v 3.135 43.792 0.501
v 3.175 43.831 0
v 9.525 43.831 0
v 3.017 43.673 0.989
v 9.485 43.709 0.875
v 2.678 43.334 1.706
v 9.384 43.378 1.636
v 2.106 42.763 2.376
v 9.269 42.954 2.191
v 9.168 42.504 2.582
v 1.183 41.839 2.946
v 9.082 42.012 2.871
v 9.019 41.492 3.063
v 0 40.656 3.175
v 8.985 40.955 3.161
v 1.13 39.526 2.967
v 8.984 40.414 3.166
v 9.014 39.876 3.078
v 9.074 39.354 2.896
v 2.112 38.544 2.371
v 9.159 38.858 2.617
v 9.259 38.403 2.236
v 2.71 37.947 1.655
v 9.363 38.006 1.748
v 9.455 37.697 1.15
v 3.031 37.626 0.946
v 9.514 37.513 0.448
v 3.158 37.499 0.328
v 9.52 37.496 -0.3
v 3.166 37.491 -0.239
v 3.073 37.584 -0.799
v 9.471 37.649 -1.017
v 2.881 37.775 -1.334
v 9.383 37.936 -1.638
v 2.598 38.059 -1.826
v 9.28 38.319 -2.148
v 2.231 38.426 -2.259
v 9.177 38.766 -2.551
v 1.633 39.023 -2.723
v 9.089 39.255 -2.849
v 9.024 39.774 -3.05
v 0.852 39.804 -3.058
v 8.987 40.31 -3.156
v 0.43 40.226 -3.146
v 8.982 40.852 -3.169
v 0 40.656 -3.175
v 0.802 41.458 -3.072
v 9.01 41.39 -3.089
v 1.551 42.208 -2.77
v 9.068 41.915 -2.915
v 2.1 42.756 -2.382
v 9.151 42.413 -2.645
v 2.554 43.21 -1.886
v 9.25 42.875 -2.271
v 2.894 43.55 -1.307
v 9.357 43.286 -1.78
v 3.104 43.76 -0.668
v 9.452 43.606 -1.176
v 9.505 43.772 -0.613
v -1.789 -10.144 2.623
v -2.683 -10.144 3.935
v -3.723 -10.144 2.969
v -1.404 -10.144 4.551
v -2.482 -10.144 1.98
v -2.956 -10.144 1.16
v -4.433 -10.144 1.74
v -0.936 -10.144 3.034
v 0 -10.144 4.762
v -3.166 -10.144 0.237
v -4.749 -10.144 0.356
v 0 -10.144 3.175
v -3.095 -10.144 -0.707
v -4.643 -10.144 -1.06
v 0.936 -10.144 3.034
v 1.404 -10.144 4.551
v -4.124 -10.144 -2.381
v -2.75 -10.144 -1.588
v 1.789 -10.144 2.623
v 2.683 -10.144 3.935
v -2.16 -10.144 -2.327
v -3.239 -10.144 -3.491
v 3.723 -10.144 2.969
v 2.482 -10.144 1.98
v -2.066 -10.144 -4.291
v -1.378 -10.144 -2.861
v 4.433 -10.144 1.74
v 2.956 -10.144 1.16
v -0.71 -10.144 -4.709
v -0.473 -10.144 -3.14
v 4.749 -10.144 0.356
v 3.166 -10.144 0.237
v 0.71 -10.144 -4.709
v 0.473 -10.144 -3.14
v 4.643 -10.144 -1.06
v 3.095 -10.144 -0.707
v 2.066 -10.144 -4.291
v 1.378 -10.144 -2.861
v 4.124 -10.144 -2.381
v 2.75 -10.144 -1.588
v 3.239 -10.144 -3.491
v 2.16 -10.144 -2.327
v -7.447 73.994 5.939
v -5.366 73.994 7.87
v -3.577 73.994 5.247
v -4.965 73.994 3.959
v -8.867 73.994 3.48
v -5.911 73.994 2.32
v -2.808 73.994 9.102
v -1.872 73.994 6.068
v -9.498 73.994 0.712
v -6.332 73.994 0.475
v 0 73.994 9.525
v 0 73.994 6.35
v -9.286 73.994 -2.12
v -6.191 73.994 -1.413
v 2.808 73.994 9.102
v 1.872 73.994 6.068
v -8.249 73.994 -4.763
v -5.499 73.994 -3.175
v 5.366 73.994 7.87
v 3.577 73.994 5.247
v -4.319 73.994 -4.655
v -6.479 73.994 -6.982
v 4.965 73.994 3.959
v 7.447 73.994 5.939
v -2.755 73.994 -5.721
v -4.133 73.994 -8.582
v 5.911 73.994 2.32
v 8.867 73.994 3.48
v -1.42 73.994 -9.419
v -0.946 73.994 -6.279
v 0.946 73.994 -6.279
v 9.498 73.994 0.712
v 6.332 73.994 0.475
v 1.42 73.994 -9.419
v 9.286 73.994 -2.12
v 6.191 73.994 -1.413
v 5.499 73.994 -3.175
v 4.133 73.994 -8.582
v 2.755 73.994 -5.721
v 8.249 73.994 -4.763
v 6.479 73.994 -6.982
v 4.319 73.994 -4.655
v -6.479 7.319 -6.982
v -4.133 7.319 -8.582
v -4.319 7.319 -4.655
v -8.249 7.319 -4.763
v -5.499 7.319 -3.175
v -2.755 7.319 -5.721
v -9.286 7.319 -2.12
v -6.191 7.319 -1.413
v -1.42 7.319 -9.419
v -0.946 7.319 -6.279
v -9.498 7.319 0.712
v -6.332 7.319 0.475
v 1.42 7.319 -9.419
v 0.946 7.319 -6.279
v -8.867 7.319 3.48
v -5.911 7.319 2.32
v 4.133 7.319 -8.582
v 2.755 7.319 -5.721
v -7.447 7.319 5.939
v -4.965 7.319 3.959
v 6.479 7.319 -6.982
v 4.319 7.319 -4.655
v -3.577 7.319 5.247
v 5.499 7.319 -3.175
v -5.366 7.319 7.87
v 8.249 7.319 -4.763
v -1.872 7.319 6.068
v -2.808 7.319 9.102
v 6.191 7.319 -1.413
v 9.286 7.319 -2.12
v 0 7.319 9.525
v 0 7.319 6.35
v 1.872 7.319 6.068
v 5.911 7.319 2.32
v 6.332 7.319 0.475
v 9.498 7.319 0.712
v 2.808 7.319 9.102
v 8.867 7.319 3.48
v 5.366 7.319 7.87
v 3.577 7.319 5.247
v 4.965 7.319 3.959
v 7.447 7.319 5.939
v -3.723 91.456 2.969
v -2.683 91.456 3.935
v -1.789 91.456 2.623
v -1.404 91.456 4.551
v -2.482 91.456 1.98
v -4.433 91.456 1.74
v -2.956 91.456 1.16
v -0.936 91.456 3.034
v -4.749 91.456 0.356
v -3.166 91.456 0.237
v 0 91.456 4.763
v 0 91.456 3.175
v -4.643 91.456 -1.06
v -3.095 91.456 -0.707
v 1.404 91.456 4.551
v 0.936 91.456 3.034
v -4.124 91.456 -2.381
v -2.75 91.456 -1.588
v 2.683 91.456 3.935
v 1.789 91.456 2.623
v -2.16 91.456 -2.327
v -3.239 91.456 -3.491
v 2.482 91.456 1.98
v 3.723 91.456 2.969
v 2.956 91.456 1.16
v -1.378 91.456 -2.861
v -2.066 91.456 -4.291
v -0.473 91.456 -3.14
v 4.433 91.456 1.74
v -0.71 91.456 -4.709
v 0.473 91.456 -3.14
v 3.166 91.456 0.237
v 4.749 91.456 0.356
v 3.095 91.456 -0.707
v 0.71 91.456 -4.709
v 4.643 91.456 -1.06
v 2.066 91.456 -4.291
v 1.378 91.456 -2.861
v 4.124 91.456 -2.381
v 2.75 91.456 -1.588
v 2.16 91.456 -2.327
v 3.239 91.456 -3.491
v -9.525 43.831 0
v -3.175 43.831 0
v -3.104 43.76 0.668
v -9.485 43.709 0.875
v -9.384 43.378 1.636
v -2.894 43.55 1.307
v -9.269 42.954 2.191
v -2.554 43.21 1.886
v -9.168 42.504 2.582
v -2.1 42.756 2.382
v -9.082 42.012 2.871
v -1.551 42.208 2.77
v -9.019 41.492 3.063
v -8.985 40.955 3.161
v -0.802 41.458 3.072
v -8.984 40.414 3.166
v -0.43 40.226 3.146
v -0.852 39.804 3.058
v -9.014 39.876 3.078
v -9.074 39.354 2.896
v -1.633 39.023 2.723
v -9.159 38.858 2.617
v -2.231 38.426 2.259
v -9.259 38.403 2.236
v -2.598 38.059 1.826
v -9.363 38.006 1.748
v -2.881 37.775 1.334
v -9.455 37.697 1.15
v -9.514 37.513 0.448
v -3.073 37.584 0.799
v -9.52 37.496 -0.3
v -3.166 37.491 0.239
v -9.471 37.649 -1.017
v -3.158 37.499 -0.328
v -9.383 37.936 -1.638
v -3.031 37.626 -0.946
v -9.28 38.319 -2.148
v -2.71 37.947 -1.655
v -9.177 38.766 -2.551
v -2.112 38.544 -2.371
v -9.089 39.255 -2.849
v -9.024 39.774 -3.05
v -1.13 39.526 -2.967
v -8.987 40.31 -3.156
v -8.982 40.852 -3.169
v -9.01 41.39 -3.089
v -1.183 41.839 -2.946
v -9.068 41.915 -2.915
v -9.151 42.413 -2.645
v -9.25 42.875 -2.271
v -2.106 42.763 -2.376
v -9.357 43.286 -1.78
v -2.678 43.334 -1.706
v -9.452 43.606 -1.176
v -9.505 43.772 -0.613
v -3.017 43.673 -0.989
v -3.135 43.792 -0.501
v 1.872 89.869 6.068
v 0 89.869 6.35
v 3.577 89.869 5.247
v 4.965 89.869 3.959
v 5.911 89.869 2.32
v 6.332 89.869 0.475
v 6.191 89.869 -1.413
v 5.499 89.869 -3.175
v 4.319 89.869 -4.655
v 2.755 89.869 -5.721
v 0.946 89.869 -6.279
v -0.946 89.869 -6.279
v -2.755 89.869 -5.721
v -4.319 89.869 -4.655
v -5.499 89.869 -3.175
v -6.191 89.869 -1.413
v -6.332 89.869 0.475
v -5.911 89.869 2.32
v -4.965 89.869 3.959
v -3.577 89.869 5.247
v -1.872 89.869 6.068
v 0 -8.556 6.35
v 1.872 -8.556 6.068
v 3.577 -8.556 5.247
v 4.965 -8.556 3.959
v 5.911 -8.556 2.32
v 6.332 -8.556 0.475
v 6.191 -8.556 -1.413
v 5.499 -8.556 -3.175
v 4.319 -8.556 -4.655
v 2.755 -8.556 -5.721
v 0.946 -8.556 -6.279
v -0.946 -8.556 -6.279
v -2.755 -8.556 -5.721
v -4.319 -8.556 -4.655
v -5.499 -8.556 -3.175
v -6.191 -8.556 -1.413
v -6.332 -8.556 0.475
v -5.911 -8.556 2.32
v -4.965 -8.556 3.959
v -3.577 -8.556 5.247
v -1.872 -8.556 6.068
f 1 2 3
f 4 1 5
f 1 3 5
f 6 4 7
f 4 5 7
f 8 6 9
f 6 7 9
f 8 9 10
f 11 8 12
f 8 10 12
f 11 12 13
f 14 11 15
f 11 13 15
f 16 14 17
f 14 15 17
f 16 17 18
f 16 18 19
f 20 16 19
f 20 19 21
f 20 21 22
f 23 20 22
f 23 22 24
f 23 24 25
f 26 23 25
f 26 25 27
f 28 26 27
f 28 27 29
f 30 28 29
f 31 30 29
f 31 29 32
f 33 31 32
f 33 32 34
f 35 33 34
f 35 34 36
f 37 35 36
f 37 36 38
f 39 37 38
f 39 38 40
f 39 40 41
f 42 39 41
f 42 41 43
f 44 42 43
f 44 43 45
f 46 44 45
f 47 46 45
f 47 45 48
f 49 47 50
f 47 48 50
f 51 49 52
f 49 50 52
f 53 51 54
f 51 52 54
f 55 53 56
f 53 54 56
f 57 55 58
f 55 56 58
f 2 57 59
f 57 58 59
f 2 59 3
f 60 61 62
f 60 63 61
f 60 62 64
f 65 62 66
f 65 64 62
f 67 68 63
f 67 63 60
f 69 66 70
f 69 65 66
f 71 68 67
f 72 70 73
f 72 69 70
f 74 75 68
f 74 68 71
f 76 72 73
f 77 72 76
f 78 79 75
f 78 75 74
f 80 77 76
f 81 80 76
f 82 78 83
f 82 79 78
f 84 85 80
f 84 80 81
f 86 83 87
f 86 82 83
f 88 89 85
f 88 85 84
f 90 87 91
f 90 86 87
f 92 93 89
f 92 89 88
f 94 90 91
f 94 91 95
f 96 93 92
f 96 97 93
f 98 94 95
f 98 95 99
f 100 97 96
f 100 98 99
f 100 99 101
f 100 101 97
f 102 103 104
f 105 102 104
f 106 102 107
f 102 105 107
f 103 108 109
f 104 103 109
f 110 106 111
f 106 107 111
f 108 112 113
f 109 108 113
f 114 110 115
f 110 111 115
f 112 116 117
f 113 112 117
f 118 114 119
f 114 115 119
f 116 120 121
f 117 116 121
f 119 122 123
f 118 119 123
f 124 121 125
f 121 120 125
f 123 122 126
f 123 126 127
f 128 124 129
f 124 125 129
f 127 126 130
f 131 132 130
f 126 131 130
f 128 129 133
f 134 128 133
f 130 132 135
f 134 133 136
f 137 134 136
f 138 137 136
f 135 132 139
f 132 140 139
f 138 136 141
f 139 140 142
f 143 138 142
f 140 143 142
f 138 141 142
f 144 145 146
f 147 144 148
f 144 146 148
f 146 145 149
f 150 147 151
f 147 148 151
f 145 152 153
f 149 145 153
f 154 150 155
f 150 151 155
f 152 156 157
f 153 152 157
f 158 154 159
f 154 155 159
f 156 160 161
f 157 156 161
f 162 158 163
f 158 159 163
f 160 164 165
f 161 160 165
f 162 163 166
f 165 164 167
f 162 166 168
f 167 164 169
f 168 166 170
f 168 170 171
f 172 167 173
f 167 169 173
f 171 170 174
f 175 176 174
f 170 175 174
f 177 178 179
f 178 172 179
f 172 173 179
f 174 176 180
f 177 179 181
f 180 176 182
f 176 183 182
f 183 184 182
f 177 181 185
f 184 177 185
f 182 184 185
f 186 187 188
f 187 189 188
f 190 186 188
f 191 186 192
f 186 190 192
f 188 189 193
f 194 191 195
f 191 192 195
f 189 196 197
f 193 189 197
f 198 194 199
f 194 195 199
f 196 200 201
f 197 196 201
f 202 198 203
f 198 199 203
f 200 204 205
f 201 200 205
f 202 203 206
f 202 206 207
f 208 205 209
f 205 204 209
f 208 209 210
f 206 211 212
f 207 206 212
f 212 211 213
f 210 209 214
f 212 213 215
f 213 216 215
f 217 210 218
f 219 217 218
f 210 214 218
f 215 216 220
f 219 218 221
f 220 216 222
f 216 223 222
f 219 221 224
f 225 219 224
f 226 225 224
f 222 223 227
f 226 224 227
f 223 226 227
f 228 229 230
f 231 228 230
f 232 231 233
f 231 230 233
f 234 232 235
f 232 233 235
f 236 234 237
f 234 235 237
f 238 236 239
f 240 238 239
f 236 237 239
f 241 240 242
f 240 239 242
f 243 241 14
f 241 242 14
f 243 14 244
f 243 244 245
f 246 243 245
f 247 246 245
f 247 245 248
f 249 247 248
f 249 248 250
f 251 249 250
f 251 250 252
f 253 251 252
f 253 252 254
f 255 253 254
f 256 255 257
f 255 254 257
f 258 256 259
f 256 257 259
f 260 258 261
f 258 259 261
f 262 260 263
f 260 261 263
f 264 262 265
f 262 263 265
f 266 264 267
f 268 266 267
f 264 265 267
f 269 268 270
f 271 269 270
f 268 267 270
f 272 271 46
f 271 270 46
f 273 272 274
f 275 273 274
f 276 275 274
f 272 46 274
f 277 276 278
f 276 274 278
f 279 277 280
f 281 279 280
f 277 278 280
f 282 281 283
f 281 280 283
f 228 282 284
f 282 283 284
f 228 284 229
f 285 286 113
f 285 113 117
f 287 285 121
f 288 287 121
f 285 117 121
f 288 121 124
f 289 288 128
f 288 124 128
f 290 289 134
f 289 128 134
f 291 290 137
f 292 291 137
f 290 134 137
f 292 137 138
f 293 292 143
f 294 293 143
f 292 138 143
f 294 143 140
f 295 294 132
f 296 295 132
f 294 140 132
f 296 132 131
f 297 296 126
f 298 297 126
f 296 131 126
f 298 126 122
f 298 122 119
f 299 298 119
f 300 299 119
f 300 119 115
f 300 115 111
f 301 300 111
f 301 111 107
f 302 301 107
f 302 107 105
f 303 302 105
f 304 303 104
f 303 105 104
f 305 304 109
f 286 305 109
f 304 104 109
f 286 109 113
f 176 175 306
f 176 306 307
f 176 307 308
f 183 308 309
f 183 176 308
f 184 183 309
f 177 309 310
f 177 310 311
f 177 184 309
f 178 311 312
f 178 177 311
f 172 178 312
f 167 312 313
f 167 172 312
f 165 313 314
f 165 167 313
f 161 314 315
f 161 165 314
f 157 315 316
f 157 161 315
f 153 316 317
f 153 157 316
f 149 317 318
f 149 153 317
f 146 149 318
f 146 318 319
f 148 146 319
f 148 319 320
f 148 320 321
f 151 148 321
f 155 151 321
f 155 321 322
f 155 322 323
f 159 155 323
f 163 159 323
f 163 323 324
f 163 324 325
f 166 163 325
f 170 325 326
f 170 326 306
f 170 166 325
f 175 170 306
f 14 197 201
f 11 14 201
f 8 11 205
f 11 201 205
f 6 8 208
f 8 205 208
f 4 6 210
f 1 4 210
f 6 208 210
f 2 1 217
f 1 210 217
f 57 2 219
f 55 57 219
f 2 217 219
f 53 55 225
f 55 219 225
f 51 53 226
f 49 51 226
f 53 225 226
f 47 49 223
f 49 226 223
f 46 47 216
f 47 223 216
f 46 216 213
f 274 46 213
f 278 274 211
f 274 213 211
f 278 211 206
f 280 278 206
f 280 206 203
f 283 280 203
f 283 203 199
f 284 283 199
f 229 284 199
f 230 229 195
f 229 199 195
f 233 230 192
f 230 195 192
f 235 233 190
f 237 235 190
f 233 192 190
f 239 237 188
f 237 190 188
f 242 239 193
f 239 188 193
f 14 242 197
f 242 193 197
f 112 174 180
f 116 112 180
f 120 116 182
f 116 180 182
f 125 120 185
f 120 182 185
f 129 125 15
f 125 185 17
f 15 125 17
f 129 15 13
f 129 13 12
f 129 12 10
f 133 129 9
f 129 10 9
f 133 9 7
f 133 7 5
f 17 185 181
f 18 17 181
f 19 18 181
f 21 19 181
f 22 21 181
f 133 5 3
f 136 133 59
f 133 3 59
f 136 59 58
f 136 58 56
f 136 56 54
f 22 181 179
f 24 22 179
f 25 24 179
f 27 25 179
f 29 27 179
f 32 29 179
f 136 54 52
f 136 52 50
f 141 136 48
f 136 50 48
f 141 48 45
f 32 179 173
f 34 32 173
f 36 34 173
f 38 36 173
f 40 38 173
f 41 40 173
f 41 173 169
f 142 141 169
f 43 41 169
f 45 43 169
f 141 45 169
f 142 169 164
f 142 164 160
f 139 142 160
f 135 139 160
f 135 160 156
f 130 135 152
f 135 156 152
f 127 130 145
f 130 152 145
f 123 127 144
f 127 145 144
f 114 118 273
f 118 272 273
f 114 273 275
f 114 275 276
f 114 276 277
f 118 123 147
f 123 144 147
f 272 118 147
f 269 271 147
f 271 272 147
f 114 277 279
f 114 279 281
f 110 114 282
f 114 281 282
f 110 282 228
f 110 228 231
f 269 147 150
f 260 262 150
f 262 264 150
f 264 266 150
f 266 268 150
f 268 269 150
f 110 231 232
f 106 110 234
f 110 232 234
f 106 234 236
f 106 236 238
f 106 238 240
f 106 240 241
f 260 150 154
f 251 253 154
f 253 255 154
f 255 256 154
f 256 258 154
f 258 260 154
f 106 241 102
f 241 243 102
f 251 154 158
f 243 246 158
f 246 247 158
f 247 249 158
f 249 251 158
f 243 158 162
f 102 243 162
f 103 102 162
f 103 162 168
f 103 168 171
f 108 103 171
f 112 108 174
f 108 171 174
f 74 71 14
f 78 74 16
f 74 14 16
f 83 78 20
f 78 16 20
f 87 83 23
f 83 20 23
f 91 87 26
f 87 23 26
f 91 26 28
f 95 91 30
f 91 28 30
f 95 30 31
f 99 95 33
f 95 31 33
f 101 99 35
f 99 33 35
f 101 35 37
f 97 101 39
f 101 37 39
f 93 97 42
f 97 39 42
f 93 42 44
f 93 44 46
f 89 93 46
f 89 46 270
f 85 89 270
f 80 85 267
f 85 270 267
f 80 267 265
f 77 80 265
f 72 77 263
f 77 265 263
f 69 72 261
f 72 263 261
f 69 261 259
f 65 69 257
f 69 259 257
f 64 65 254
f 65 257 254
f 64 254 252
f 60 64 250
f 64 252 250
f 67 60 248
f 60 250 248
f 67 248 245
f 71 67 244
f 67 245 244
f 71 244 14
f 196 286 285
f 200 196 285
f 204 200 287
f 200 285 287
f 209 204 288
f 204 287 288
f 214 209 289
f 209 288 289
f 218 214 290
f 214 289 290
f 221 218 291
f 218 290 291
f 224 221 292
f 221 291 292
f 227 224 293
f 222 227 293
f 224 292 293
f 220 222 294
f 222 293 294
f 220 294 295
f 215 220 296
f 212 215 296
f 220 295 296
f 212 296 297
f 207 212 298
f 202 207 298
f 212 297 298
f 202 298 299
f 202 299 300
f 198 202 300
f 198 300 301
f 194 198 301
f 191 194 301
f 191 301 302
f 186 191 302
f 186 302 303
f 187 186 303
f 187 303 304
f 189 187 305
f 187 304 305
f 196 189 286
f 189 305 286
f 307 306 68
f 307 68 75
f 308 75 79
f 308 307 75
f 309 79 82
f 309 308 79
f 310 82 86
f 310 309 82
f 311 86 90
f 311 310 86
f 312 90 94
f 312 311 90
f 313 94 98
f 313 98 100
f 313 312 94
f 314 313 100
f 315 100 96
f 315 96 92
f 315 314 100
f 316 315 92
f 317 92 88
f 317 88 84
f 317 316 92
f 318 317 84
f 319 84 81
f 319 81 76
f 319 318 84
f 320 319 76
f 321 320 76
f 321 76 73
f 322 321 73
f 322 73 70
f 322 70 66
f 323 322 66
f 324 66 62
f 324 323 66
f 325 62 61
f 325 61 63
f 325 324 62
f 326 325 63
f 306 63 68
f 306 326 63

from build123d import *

# Parameters (mm, degrees)
F0_W     = 17.4625
F0_H     = 3.175
F2_W     = 13.680584
F2_H     = 12.9563
F3_DEPTH = 0.014764
F4_R     = 3.175
F5_DEPTH = 25.4
F6_SIZE2 = 1.5875
F6_SIZE  = 1.5875


with BuildPart() as f1:
    # F0 (on Right) → F1 (revolve)
    with BuildSketch(Plane.YZ):
        with Locations((-1.412255, 4.7625)):
            Rectangle(F0_W, F0_H)
        Polygon((7.318995, 6.35), (7.318995, 3.175), (47.006495, 3.175), (91.456495, 3.175), (91.456495, 6.35), (73.993995, 6.35), (73.993995, 9.525), (7.318995, 9.525), align=None)
    revolve(axis=Axis((0, 40.656495, 0), (0, 1, 0)))

    # F4 (on face) → F5 (cut)
    with BuildSketch(Plane.YZ.offset(9.525)):
        with Locations((40.656495, 0)):
            Circle(F4_R)
    extrude(amount=-F5_DEPTH, mode=Mode.SUBTRACT)

    # F6
    f6_edges = [f1.edges().sort_by_distance(p)[0] for p in [
        (0, -10.143505, -6.35),
        (0, 91.456495, -6.35),
    ]]
    chamfer(f6_edges, length=F6_SIZE, length2=F6_SIZE2)


with BuildPart() as f3:
    # F2 (on Right) → F3 (new body)
    with BuildSketch(Plane.YZ):
        with Locations((-37.624579, 0)):
            Rectangle(F2_W, F2_H)
    extrude(amount=F3_DEPTH)


solid = f1.part
